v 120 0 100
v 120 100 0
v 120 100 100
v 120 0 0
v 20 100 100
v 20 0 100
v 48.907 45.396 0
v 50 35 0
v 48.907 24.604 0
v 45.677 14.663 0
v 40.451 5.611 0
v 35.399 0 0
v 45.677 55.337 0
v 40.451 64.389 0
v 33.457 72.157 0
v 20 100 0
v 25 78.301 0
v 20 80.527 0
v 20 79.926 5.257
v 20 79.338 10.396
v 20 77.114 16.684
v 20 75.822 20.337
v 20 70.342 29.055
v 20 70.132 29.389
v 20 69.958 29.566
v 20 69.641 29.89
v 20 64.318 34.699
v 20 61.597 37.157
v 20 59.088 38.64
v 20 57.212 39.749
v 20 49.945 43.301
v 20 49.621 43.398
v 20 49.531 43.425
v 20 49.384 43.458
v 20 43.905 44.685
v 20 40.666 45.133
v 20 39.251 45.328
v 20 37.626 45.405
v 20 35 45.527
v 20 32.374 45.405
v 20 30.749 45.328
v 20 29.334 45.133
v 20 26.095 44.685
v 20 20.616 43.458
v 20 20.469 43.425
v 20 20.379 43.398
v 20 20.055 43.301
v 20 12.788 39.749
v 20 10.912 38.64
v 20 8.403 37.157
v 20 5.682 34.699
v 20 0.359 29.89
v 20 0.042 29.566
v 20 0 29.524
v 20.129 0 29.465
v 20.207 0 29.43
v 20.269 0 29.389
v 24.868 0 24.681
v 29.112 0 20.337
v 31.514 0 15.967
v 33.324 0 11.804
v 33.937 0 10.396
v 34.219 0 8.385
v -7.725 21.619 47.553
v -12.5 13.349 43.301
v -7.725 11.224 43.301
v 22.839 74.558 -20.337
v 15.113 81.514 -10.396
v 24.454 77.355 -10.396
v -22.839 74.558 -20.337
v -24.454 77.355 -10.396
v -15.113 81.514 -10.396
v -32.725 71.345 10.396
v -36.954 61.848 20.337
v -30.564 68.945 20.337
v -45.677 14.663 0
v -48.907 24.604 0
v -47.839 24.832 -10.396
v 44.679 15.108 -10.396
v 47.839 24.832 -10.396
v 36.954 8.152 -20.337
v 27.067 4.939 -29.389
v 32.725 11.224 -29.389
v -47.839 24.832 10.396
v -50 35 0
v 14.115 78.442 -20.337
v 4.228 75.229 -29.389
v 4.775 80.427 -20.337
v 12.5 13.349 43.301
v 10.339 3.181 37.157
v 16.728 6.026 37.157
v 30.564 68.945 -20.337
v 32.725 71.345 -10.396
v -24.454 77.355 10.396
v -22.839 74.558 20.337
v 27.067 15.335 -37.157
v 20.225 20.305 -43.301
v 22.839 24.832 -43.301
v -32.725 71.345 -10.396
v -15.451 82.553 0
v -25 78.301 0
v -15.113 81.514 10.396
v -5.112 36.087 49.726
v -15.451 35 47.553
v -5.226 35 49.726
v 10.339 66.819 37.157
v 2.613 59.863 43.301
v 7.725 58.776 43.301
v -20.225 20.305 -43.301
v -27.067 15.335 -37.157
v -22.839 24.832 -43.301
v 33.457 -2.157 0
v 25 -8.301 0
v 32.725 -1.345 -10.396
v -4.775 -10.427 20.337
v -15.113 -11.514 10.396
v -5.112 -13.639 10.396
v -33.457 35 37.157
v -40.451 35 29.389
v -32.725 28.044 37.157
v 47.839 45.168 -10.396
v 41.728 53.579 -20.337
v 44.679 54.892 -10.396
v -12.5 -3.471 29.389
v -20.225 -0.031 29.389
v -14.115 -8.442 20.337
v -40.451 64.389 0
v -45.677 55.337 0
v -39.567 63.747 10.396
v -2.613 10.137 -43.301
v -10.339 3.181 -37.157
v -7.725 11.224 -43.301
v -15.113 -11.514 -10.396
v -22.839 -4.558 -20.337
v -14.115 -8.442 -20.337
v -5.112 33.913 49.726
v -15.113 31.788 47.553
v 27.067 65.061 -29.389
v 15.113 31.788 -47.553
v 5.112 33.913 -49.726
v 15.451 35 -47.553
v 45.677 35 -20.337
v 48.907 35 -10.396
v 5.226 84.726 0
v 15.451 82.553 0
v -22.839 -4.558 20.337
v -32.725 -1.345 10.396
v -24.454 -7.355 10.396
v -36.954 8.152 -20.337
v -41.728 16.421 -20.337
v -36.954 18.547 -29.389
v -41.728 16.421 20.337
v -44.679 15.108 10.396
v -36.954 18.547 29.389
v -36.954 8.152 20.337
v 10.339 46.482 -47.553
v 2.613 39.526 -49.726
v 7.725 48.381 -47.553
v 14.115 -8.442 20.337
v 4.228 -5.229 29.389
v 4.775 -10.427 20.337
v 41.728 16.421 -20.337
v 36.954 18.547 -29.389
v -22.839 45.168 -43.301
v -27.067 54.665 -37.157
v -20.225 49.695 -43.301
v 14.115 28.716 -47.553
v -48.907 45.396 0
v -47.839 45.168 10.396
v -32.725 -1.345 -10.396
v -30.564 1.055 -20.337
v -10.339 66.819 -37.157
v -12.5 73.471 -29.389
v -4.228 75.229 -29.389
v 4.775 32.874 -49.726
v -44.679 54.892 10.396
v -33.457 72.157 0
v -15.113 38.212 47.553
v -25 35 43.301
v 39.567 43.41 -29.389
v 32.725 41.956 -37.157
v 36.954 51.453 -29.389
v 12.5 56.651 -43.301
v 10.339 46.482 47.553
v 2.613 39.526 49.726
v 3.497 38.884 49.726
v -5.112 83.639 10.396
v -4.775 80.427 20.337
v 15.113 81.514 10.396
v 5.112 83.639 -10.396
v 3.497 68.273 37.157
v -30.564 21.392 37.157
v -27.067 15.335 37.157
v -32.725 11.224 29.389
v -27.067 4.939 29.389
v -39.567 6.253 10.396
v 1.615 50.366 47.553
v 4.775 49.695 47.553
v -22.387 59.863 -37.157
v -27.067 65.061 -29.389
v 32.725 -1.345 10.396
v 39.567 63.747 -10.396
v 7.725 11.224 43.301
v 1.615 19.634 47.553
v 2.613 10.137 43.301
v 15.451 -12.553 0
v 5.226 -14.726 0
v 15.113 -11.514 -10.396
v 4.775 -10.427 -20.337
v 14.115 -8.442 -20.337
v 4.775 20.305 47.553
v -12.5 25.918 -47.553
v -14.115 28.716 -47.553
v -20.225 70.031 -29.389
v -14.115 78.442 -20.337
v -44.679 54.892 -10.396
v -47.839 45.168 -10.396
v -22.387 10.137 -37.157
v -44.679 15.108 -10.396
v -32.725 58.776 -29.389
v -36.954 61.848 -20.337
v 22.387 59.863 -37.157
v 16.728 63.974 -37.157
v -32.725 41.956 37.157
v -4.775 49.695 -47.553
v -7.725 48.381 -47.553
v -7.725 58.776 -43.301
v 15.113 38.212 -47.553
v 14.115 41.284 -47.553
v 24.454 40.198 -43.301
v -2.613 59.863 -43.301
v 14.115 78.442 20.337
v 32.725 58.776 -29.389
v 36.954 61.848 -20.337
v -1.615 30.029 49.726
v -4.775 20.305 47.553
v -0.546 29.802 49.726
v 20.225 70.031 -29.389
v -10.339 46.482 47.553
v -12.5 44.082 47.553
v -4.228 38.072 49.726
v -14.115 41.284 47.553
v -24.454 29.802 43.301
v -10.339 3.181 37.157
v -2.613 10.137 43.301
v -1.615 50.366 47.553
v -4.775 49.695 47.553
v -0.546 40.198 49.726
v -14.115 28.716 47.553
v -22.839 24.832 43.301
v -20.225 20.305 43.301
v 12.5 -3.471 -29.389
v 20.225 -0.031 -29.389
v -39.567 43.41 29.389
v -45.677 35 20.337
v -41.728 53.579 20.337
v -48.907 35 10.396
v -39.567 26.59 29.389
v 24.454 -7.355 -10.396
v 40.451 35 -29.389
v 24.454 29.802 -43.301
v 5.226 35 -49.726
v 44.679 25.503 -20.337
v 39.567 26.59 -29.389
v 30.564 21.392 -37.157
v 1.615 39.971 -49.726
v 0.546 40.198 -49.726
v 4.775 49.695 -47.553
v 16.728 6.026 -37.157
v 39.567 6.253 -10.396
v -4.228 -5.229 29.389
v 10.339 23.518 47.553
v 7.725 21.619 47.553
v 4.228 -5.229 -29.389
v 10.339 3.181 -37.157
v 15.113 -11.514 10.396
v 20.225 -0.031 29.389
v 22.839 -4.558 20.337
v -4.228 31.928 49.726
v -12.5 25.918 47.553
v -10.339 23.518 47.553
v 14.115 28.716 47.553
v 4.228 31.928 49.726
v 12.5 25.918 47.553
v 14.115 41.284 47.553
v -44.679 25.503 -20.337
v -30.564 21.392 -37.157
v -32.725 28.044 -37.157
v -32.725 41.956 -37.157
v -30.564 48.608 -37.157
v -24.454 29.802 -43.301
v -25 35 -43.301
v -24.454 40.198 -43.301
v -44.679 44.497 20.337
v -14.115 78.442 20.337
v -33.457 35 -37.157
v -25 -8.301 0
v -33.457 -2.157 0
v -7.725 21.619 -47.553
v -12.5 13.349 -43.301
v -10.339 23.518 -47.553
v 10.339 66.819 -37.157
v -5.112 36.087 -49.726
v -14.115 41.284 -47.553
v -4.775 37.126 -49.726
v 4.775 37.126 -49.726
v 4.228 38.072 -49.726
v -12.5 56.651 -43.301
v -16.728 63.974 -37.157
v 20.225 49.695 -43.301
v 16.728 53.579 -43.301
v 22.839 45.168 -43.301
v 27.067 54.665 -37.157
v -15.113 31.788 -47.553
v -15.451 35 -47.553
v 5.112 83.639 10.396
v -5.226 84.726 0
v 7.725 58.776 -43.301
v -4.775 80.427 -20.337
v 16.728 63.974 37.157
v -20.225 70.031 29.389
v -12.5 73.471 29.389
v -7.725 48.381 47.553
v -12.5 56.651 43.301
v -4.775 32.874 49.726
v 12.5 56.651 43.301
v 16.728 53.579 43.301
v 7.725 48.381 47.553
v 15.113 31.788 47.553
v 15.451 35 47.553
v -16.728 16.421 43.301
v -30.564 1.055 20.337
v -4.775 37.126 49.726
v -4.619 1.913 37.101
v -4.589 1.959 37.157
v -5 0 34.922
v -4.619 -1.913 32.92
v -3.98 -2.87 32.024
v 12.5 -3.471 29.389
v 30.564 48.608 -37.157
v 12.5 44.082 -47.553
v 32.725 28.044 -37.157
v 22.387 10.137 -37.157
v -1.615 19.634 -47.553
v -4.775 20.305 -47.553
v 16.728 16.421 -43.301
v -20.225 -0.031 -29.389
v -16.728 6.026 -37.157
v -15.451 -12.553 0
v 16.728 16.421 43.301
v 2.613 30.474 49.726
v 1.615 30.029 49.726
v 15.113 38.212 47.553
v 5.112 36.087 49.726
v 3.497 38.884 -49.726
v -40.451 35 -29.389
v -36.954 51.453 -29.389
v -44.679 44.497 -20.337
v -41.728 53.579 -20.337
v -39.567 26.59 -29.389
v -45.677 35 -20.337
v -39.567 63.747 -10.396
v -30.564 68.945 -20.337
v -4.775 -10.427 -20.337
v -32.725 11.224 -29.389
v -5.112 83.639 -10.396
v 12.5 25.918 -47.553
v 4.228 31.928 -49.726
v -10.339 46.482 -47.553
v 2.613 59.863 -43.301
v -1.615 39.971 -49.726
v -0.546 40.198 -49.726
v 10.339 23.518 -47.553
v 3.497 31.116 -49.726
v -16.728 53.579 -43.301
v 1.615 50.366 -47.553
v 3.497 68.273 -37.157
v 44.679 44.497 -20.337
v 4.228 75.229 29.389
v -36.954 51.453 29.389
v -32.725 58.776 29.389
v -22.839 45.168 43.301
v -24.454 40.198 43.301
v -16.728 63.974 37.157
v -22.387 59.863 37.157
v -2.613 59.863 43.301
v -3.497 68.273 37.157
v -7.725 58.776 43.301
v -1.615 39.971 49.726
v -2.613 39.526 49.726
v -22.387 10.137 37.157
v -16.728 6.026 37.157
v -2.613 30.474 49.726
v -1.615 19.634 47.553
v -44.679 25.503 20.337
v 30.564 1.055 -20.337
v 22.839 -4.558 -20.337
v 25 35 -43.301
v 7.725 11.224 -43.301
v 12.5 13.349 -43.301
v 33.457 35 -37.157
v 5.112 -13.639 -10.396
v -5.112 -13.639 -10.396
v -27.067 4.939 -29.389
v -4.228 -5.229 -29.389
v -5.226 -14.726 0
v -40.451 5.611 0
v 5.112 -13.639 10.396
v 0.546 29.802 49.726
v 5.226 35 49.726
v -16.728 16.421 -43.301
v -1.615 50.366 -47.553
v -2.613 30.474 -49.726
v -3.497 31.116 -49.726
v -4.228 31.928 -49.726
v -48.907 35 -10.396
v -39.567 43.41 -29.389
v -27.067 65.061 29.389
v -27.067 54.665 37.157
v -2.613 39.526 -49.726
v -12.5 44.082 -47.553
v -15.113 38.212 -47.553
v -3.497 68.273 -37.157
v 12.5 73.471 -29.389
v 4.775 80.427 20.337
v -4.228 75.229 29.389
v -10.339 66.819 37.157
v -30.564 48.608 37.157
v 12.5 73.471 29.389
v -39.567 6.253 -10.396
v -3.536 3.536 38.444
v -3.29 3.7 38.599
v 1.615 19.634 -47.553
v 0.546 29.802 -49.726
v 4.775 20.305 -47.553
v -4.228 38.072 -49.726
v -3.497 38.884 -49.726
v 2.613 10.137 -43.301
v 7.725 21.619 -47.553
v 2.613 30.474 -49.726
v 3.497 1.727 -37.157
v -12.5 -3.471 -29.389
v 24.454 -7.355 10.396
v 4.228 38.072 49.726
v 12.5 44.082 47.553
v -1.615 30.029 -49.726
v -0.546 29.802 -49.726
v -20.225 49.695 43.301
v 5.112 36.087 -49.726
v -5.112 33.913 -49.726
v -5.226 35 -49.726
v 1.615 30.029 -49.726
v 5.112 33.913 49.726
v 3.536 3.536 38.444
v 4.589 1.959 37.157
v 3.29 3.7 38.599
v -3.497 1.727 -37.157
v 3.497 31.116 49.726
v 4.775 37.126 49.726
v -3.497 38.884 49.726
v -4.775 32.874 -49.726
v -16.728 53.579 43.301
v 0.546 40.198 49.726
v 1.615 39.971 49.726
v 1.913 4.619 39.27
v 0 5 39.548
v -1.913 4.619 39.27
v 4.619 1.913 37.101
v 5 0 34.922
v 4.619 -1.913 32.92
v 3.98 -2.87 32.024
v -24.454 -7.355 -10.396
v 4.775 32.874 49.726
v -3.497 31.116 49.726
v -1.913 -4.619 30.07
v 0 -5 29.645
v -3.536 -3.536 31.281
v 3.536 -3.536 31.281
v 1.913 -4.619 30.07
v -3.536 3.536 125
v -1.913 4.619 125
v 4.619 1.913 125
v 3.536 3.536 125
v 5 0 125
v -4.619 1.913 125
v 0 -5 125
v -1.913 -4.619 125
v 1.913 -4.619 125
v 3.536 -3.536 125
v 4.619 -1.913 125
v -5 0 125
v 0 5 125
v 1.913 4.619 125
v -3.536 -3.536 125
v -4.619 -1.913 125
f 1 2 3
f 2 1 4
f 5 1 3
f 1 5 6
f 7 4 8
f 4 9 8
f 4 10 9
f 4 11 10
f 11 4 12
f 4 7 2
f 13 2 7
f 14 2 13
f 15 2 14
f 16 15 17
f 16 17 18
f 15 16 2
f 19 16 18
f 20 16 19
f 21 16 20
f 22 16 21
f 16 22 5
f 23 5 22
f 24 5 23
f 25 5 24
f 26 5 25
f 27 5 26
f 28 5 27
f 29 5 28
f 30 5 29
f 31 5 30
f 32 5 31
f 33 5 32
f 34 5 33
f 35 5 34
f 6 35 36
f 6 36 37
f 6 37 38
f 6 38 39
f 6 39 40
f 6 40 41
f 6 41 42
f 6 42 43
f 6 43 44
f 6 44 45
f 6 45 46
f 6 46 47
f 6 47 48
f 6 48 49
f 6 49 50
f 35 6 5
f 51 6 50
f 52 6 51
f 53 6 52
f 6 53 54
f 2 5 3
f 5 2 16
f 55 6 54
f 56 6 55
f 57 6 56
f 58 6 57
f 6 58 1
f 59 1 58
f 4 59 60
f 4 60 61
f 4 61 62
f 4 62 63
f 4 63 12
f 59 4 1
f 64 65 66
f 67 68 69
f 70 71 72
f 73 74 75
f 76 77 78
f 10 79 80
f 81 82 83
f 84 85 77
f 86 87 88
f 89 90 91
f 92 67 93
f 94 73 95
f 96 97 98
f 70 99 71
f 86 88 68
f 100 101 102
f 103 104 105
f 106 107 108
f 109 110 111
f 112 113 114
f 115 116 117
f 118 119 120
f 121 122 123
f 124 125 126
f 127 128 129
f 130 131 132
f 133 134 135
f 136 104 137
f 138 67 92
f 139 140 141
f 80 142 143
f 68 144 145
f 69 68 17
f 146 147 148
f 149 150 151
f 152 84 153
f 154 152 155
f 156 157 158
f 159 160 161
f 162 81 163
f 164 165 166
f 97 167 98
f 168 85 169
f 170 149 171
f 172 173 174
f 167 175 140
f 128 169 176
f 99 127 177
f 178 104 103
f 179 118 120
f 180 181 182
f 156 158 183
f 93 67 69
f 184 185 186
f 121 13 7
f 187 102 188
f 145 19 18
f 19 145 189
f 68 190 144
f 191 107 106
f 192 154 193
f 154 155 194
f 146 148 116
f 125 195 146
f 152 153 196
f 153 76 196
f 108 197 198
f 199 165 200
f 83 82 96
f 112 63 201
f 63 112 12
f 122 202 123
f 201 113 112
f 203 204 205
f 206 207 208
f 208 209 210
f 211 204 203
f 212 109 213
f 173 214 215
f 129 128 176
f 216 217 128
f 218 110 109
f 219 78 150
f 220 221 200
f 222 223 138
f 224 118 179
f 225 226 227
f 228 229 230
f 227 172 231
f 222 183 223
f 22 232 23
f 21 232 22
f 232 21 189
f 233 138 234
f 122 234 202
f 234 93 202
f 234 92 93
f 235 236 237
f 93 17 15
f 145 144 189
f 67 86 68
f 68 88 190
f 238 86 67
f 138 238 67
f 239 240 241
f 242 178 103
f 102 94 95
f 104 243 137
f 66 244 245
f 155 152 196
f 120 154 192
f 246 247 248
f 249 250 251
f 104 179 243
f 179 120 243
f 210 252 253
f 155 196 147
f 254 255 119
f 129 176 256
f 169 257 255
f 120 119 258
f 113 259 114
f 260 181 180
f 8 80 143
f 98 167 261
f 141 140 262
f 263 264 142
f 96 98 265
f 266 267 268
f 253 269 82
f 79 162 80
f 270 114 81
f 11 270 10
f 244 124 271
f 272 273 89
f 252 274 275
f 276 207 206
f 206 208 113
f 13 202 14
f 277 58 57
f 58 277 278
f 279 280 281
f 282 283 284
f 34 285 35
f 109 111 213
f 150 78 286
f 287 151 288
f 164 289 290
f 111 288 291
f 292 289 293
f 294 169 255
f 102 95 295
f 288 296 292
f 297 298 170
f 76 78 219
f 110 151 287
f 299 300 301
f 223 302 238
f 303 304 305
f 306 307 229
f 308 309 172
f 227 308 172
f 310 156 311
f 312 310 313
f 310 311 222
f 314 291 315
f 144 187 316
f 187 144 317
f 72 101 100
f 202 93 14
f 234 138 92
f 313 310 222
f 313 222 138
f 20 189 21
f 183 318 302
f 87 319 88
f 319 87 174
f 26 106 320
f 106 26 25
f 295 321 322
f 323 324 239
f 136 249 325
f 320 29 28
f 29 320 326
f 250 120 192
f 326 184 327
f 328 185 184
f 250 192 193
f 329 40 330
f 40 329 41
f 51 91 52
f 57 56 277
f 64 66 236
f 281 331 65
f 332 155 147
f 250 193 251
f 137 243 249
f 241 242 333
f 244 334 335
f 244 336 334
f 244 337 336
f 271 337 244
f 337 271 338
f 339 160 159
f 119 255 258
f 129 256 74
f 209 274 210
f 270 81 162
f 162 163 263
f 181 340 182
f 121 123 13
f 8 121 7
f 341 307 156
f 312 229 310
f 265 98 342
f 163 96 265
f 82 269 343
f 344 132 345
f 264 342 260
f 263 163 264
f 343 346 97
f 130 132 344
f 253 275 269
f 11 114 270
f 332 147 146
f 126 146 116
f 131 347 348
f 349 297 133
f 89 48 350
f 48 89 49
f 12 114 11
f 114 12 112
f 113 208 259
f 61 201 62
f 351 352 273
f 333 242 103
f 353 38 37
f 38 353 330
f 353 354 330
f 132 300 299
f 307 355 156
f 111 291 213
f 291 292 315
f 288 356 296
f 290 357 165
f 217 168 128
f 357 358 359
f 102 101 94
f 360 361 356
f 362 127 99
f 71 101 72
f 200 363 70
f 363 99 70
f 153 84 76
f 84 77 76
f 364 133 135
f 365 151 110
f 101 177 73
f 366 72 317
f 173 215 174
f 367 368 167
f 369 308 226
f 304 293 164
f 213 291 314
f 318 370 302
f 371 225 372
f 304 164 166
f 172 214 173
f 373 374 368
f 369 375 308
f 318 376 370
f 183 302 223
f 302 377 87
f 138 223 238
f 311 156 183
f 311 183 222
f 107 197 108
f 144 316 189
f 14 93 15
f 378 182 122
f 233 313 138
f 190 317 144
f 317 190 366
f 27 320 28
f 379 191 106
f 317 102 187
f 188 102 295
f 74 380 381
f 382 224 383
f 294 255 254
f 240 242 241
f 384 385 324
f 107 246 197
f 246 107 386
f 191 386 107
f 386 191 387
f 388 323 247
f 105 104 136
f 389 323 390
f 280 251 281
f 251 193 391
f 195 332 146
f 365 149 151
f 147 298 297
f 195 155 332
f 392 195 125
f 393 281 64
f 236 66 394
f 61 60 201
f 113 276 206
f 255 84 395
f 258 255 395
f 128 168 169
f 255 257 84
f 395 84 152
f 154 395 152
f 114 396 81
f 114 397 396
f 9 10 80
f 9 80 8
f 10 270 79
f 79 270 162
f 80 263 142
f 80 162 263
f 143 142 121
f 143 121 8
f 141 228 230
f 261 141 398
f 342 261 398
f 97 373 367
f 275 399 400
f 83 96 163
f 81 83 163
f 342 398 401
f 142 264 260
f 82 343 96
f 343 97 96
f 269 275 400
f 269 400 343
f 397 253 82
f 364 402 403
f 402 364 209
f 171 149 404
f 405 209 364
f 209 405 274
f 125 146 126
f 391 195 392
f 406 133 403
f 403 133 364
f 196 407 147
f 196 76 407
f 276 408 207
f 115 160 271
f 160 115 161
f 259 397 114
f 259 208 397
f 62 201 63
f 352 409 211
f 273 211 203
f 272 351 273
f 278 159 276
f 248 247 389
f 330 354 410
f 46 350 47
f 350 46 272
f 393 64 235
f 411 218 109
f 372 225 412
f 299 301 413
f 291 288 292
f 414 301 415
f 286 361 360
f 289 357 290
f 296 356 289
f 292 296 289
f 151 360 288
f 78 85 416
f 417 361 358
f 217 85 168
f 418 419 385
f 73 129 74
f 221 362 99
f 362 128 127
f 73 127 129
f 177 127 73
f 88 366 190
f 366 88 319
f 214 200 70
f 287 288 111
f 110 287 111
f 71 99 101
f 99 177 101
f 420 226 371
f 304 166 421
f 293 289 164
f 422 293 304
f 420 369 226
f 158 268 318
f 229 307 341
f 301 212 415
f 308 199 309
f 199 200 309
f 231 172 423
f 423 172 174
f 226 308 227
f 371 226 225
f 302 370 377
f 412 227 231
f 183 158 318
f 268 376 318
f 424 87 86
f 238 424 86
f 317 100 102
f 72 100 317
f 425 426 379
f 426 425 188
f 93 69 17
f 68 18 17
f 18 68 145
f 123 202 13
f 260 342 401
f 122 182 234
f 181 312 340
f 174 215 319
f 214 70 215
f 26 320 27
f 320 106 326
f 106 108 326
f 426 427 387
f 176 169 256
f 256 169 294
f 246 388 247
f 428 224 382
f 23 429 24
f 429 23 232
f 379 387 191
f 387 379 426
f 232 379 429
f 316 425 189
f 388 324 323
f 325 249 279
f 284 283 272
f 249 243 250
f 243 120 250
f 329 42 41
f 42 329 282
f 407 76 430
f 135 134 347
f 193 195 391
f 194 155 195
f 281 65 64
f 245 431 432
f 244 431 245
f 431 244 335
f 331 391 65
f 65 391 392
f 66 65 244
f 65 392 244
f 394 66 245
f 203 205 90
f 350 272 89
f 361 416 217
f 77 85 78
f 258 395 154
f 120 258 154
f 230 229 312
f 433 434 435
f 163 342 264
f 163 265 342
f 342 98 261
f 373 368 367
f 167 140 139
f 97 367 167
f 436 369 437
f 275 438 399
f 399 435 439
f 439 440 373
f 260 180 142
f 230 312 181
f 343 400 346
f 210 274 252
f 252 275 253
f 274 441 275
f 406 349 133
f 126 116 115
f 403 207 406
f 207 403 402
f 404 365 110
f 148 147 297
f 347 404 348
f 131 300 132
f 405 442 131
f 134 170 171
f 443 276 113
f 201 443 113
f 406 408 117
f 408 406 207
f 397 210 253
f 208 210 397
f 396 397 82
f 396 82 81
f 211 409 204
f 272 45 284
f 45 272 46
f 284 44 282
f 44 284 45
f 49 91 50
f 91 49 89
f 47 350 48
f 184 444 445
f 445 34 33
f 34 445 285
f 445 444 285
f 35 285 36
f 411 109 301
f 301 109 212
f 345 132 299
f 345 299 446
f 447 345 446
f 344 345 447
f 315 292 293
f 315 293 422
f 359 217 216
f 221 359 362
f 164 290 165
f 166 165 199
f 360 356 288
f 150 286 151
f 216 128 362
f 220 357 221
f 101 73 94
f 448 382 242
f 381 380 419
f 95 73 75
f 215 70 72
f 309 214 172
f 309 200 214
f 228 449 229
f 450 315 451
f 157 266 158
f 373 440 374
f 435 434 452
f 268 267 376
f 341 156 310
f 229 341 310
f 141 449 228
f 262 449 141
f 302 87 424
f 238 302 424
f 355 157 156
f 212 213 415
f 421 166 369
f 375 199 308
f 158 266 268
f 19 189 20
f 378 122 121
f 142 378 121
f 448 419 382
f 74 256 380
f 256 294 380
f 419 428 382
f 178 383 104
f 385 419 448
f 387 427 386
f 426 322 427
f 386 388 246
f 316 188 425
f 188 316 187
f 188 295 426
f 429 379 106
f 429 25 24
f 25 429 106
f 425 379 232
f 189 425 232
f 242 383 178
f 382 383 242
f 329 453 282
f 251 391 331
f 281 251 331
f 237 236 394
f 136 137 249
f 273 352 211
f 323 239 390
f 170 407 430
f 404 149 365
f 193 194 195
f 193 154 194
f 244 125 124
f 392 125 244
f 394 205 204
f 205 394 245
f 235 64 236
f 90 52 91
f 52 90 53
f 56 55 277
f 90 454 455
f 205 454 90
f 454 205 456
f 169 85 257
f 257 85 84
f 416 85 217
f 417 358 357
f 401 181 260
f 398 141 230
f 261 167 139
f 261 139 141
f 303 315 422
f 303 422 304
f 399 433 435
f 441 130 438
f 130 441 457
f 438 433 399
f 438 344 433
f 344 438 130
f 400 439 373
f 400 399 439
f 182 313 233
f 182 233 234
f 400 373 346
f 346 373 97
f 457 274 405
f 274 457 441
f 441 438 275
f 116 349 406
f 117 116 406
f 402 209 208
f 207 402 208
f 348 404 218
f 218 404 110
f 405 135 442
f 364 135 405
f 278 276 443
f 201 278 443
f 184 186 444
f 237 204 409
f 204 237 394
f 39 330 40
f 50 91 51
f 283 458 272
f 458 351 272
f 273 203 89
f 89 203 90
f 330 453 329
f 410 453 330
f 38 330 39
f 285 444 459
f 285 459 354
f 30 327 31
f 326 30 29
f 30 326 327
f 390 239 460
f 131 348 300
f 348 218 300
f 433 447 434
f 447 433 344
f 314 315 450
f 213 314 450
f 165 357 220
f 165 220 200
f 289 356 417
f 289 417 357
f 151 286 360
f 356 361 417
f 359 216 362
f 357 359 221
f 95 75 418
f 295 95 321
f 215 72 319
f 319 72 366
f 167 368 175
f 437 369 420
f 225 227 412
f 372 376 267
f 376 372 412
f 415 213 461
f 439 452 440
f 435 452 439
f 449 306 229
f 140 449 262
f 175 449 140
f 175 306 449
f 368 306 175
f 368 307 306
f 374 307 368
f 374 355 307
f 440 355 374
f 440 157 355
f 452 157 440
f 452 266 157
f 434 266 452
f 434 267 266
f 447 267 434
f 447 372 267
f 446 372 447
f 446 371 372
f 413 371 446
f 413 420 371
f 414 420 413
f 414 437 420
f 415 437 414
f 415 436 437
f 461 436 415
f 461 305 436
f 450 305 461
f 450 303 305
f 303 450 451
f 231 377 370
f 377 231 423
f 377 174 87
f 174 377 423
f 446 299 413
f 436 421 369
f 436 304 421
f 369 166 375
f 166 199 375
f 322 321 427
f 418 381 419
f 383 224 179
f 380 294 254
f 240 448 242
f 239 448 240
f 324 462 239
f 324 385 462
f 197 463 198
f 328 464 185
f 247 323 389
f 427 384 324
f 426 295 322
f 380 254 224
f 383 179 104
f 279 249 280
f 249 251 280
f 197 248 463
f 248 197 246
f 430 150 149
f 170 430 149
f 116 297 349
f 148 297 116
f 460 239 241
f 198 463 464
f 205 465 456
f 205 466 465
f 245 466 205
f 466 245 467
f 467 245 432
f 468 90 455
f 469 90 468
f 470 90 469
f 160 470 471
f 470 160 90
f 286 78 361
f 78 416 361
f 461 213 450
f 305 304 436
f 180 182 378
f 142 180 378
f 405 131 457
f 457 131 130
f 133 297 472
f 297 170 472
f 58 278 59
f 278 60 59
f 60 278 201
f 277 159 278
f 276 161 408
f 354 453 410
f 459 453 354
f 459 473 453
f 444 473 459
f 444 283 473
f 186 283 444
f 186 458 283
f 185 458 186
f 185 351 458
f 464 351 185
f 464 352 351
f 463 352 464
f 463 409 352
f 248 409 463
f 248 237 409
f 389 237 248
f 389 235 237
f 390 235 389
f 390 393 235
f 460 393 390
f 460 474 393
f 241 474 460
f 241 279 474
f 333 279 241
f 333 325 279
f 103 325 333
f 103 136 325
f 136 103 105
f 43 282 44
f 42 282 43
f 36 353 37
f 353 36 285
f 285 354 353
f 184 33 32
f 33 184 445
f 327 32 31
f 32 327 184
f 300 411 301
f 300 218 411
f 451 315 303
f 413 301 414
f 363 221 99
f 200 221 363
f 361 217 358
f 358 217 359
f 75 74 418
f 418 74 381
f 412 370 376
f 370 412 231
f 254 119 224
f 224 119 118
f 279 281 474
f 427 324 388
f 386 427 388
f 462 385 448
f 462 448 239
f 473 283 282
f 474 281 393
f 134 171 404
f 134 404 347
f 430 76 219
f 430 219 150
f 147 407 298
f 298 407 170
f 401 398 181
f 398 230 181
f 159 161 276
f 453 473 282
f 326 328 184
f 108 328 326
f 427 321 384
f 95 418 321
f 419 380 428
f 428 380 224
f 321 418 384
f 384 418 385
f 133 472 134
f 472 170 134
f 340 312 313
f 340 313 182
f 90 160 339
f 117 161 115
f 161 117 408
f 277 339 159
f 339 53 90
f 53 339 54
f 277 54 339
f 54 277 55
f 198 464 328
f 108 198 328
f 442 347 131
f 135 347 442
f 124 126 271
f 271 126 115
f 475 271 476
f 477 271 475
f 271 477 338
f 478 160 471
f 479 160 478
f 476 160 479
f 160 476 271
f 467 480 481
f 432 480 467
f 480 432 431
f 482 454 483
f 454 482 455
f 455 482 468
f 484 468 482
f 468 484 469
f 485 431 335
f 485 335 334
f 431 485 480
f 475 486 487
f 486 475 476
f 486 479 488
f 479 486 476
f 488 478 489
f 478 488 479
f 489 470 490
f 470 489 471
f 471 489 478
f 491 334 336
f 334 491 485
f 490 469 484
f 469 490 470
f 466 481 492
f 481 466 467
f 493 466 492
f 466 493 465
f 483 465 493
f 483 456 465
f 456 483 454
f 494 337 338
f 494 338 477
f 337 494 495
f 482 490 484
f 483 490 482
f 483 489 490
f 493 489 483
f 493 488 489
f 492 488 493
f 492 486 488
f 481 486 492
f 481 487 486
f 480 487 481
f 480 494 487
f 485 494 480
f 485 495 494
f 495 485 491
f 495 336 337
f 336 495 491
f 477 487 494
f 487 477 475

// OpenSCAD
// Varied size primitives test
union() {
    cube([1, 1, 1]);
    translate([5, 0, 0]) cube([10, 10, 10]);
    translate([20, 0, 0]) cube([100, 100, 100]);
    translate([0, 15, 0]) sphere(r=1);
    translate([0, 20, 0]) sphere(r=10);
    translate([0, 35, 0]) sphere(r=50);
    translate([0, 0, 5]) cylinder(h=1, r=5);
    translate([0, 0, 10]) cylinder(h=10, r=5);
    translate([0, 0, 25]) cylinder(h=100, r=5);
}
